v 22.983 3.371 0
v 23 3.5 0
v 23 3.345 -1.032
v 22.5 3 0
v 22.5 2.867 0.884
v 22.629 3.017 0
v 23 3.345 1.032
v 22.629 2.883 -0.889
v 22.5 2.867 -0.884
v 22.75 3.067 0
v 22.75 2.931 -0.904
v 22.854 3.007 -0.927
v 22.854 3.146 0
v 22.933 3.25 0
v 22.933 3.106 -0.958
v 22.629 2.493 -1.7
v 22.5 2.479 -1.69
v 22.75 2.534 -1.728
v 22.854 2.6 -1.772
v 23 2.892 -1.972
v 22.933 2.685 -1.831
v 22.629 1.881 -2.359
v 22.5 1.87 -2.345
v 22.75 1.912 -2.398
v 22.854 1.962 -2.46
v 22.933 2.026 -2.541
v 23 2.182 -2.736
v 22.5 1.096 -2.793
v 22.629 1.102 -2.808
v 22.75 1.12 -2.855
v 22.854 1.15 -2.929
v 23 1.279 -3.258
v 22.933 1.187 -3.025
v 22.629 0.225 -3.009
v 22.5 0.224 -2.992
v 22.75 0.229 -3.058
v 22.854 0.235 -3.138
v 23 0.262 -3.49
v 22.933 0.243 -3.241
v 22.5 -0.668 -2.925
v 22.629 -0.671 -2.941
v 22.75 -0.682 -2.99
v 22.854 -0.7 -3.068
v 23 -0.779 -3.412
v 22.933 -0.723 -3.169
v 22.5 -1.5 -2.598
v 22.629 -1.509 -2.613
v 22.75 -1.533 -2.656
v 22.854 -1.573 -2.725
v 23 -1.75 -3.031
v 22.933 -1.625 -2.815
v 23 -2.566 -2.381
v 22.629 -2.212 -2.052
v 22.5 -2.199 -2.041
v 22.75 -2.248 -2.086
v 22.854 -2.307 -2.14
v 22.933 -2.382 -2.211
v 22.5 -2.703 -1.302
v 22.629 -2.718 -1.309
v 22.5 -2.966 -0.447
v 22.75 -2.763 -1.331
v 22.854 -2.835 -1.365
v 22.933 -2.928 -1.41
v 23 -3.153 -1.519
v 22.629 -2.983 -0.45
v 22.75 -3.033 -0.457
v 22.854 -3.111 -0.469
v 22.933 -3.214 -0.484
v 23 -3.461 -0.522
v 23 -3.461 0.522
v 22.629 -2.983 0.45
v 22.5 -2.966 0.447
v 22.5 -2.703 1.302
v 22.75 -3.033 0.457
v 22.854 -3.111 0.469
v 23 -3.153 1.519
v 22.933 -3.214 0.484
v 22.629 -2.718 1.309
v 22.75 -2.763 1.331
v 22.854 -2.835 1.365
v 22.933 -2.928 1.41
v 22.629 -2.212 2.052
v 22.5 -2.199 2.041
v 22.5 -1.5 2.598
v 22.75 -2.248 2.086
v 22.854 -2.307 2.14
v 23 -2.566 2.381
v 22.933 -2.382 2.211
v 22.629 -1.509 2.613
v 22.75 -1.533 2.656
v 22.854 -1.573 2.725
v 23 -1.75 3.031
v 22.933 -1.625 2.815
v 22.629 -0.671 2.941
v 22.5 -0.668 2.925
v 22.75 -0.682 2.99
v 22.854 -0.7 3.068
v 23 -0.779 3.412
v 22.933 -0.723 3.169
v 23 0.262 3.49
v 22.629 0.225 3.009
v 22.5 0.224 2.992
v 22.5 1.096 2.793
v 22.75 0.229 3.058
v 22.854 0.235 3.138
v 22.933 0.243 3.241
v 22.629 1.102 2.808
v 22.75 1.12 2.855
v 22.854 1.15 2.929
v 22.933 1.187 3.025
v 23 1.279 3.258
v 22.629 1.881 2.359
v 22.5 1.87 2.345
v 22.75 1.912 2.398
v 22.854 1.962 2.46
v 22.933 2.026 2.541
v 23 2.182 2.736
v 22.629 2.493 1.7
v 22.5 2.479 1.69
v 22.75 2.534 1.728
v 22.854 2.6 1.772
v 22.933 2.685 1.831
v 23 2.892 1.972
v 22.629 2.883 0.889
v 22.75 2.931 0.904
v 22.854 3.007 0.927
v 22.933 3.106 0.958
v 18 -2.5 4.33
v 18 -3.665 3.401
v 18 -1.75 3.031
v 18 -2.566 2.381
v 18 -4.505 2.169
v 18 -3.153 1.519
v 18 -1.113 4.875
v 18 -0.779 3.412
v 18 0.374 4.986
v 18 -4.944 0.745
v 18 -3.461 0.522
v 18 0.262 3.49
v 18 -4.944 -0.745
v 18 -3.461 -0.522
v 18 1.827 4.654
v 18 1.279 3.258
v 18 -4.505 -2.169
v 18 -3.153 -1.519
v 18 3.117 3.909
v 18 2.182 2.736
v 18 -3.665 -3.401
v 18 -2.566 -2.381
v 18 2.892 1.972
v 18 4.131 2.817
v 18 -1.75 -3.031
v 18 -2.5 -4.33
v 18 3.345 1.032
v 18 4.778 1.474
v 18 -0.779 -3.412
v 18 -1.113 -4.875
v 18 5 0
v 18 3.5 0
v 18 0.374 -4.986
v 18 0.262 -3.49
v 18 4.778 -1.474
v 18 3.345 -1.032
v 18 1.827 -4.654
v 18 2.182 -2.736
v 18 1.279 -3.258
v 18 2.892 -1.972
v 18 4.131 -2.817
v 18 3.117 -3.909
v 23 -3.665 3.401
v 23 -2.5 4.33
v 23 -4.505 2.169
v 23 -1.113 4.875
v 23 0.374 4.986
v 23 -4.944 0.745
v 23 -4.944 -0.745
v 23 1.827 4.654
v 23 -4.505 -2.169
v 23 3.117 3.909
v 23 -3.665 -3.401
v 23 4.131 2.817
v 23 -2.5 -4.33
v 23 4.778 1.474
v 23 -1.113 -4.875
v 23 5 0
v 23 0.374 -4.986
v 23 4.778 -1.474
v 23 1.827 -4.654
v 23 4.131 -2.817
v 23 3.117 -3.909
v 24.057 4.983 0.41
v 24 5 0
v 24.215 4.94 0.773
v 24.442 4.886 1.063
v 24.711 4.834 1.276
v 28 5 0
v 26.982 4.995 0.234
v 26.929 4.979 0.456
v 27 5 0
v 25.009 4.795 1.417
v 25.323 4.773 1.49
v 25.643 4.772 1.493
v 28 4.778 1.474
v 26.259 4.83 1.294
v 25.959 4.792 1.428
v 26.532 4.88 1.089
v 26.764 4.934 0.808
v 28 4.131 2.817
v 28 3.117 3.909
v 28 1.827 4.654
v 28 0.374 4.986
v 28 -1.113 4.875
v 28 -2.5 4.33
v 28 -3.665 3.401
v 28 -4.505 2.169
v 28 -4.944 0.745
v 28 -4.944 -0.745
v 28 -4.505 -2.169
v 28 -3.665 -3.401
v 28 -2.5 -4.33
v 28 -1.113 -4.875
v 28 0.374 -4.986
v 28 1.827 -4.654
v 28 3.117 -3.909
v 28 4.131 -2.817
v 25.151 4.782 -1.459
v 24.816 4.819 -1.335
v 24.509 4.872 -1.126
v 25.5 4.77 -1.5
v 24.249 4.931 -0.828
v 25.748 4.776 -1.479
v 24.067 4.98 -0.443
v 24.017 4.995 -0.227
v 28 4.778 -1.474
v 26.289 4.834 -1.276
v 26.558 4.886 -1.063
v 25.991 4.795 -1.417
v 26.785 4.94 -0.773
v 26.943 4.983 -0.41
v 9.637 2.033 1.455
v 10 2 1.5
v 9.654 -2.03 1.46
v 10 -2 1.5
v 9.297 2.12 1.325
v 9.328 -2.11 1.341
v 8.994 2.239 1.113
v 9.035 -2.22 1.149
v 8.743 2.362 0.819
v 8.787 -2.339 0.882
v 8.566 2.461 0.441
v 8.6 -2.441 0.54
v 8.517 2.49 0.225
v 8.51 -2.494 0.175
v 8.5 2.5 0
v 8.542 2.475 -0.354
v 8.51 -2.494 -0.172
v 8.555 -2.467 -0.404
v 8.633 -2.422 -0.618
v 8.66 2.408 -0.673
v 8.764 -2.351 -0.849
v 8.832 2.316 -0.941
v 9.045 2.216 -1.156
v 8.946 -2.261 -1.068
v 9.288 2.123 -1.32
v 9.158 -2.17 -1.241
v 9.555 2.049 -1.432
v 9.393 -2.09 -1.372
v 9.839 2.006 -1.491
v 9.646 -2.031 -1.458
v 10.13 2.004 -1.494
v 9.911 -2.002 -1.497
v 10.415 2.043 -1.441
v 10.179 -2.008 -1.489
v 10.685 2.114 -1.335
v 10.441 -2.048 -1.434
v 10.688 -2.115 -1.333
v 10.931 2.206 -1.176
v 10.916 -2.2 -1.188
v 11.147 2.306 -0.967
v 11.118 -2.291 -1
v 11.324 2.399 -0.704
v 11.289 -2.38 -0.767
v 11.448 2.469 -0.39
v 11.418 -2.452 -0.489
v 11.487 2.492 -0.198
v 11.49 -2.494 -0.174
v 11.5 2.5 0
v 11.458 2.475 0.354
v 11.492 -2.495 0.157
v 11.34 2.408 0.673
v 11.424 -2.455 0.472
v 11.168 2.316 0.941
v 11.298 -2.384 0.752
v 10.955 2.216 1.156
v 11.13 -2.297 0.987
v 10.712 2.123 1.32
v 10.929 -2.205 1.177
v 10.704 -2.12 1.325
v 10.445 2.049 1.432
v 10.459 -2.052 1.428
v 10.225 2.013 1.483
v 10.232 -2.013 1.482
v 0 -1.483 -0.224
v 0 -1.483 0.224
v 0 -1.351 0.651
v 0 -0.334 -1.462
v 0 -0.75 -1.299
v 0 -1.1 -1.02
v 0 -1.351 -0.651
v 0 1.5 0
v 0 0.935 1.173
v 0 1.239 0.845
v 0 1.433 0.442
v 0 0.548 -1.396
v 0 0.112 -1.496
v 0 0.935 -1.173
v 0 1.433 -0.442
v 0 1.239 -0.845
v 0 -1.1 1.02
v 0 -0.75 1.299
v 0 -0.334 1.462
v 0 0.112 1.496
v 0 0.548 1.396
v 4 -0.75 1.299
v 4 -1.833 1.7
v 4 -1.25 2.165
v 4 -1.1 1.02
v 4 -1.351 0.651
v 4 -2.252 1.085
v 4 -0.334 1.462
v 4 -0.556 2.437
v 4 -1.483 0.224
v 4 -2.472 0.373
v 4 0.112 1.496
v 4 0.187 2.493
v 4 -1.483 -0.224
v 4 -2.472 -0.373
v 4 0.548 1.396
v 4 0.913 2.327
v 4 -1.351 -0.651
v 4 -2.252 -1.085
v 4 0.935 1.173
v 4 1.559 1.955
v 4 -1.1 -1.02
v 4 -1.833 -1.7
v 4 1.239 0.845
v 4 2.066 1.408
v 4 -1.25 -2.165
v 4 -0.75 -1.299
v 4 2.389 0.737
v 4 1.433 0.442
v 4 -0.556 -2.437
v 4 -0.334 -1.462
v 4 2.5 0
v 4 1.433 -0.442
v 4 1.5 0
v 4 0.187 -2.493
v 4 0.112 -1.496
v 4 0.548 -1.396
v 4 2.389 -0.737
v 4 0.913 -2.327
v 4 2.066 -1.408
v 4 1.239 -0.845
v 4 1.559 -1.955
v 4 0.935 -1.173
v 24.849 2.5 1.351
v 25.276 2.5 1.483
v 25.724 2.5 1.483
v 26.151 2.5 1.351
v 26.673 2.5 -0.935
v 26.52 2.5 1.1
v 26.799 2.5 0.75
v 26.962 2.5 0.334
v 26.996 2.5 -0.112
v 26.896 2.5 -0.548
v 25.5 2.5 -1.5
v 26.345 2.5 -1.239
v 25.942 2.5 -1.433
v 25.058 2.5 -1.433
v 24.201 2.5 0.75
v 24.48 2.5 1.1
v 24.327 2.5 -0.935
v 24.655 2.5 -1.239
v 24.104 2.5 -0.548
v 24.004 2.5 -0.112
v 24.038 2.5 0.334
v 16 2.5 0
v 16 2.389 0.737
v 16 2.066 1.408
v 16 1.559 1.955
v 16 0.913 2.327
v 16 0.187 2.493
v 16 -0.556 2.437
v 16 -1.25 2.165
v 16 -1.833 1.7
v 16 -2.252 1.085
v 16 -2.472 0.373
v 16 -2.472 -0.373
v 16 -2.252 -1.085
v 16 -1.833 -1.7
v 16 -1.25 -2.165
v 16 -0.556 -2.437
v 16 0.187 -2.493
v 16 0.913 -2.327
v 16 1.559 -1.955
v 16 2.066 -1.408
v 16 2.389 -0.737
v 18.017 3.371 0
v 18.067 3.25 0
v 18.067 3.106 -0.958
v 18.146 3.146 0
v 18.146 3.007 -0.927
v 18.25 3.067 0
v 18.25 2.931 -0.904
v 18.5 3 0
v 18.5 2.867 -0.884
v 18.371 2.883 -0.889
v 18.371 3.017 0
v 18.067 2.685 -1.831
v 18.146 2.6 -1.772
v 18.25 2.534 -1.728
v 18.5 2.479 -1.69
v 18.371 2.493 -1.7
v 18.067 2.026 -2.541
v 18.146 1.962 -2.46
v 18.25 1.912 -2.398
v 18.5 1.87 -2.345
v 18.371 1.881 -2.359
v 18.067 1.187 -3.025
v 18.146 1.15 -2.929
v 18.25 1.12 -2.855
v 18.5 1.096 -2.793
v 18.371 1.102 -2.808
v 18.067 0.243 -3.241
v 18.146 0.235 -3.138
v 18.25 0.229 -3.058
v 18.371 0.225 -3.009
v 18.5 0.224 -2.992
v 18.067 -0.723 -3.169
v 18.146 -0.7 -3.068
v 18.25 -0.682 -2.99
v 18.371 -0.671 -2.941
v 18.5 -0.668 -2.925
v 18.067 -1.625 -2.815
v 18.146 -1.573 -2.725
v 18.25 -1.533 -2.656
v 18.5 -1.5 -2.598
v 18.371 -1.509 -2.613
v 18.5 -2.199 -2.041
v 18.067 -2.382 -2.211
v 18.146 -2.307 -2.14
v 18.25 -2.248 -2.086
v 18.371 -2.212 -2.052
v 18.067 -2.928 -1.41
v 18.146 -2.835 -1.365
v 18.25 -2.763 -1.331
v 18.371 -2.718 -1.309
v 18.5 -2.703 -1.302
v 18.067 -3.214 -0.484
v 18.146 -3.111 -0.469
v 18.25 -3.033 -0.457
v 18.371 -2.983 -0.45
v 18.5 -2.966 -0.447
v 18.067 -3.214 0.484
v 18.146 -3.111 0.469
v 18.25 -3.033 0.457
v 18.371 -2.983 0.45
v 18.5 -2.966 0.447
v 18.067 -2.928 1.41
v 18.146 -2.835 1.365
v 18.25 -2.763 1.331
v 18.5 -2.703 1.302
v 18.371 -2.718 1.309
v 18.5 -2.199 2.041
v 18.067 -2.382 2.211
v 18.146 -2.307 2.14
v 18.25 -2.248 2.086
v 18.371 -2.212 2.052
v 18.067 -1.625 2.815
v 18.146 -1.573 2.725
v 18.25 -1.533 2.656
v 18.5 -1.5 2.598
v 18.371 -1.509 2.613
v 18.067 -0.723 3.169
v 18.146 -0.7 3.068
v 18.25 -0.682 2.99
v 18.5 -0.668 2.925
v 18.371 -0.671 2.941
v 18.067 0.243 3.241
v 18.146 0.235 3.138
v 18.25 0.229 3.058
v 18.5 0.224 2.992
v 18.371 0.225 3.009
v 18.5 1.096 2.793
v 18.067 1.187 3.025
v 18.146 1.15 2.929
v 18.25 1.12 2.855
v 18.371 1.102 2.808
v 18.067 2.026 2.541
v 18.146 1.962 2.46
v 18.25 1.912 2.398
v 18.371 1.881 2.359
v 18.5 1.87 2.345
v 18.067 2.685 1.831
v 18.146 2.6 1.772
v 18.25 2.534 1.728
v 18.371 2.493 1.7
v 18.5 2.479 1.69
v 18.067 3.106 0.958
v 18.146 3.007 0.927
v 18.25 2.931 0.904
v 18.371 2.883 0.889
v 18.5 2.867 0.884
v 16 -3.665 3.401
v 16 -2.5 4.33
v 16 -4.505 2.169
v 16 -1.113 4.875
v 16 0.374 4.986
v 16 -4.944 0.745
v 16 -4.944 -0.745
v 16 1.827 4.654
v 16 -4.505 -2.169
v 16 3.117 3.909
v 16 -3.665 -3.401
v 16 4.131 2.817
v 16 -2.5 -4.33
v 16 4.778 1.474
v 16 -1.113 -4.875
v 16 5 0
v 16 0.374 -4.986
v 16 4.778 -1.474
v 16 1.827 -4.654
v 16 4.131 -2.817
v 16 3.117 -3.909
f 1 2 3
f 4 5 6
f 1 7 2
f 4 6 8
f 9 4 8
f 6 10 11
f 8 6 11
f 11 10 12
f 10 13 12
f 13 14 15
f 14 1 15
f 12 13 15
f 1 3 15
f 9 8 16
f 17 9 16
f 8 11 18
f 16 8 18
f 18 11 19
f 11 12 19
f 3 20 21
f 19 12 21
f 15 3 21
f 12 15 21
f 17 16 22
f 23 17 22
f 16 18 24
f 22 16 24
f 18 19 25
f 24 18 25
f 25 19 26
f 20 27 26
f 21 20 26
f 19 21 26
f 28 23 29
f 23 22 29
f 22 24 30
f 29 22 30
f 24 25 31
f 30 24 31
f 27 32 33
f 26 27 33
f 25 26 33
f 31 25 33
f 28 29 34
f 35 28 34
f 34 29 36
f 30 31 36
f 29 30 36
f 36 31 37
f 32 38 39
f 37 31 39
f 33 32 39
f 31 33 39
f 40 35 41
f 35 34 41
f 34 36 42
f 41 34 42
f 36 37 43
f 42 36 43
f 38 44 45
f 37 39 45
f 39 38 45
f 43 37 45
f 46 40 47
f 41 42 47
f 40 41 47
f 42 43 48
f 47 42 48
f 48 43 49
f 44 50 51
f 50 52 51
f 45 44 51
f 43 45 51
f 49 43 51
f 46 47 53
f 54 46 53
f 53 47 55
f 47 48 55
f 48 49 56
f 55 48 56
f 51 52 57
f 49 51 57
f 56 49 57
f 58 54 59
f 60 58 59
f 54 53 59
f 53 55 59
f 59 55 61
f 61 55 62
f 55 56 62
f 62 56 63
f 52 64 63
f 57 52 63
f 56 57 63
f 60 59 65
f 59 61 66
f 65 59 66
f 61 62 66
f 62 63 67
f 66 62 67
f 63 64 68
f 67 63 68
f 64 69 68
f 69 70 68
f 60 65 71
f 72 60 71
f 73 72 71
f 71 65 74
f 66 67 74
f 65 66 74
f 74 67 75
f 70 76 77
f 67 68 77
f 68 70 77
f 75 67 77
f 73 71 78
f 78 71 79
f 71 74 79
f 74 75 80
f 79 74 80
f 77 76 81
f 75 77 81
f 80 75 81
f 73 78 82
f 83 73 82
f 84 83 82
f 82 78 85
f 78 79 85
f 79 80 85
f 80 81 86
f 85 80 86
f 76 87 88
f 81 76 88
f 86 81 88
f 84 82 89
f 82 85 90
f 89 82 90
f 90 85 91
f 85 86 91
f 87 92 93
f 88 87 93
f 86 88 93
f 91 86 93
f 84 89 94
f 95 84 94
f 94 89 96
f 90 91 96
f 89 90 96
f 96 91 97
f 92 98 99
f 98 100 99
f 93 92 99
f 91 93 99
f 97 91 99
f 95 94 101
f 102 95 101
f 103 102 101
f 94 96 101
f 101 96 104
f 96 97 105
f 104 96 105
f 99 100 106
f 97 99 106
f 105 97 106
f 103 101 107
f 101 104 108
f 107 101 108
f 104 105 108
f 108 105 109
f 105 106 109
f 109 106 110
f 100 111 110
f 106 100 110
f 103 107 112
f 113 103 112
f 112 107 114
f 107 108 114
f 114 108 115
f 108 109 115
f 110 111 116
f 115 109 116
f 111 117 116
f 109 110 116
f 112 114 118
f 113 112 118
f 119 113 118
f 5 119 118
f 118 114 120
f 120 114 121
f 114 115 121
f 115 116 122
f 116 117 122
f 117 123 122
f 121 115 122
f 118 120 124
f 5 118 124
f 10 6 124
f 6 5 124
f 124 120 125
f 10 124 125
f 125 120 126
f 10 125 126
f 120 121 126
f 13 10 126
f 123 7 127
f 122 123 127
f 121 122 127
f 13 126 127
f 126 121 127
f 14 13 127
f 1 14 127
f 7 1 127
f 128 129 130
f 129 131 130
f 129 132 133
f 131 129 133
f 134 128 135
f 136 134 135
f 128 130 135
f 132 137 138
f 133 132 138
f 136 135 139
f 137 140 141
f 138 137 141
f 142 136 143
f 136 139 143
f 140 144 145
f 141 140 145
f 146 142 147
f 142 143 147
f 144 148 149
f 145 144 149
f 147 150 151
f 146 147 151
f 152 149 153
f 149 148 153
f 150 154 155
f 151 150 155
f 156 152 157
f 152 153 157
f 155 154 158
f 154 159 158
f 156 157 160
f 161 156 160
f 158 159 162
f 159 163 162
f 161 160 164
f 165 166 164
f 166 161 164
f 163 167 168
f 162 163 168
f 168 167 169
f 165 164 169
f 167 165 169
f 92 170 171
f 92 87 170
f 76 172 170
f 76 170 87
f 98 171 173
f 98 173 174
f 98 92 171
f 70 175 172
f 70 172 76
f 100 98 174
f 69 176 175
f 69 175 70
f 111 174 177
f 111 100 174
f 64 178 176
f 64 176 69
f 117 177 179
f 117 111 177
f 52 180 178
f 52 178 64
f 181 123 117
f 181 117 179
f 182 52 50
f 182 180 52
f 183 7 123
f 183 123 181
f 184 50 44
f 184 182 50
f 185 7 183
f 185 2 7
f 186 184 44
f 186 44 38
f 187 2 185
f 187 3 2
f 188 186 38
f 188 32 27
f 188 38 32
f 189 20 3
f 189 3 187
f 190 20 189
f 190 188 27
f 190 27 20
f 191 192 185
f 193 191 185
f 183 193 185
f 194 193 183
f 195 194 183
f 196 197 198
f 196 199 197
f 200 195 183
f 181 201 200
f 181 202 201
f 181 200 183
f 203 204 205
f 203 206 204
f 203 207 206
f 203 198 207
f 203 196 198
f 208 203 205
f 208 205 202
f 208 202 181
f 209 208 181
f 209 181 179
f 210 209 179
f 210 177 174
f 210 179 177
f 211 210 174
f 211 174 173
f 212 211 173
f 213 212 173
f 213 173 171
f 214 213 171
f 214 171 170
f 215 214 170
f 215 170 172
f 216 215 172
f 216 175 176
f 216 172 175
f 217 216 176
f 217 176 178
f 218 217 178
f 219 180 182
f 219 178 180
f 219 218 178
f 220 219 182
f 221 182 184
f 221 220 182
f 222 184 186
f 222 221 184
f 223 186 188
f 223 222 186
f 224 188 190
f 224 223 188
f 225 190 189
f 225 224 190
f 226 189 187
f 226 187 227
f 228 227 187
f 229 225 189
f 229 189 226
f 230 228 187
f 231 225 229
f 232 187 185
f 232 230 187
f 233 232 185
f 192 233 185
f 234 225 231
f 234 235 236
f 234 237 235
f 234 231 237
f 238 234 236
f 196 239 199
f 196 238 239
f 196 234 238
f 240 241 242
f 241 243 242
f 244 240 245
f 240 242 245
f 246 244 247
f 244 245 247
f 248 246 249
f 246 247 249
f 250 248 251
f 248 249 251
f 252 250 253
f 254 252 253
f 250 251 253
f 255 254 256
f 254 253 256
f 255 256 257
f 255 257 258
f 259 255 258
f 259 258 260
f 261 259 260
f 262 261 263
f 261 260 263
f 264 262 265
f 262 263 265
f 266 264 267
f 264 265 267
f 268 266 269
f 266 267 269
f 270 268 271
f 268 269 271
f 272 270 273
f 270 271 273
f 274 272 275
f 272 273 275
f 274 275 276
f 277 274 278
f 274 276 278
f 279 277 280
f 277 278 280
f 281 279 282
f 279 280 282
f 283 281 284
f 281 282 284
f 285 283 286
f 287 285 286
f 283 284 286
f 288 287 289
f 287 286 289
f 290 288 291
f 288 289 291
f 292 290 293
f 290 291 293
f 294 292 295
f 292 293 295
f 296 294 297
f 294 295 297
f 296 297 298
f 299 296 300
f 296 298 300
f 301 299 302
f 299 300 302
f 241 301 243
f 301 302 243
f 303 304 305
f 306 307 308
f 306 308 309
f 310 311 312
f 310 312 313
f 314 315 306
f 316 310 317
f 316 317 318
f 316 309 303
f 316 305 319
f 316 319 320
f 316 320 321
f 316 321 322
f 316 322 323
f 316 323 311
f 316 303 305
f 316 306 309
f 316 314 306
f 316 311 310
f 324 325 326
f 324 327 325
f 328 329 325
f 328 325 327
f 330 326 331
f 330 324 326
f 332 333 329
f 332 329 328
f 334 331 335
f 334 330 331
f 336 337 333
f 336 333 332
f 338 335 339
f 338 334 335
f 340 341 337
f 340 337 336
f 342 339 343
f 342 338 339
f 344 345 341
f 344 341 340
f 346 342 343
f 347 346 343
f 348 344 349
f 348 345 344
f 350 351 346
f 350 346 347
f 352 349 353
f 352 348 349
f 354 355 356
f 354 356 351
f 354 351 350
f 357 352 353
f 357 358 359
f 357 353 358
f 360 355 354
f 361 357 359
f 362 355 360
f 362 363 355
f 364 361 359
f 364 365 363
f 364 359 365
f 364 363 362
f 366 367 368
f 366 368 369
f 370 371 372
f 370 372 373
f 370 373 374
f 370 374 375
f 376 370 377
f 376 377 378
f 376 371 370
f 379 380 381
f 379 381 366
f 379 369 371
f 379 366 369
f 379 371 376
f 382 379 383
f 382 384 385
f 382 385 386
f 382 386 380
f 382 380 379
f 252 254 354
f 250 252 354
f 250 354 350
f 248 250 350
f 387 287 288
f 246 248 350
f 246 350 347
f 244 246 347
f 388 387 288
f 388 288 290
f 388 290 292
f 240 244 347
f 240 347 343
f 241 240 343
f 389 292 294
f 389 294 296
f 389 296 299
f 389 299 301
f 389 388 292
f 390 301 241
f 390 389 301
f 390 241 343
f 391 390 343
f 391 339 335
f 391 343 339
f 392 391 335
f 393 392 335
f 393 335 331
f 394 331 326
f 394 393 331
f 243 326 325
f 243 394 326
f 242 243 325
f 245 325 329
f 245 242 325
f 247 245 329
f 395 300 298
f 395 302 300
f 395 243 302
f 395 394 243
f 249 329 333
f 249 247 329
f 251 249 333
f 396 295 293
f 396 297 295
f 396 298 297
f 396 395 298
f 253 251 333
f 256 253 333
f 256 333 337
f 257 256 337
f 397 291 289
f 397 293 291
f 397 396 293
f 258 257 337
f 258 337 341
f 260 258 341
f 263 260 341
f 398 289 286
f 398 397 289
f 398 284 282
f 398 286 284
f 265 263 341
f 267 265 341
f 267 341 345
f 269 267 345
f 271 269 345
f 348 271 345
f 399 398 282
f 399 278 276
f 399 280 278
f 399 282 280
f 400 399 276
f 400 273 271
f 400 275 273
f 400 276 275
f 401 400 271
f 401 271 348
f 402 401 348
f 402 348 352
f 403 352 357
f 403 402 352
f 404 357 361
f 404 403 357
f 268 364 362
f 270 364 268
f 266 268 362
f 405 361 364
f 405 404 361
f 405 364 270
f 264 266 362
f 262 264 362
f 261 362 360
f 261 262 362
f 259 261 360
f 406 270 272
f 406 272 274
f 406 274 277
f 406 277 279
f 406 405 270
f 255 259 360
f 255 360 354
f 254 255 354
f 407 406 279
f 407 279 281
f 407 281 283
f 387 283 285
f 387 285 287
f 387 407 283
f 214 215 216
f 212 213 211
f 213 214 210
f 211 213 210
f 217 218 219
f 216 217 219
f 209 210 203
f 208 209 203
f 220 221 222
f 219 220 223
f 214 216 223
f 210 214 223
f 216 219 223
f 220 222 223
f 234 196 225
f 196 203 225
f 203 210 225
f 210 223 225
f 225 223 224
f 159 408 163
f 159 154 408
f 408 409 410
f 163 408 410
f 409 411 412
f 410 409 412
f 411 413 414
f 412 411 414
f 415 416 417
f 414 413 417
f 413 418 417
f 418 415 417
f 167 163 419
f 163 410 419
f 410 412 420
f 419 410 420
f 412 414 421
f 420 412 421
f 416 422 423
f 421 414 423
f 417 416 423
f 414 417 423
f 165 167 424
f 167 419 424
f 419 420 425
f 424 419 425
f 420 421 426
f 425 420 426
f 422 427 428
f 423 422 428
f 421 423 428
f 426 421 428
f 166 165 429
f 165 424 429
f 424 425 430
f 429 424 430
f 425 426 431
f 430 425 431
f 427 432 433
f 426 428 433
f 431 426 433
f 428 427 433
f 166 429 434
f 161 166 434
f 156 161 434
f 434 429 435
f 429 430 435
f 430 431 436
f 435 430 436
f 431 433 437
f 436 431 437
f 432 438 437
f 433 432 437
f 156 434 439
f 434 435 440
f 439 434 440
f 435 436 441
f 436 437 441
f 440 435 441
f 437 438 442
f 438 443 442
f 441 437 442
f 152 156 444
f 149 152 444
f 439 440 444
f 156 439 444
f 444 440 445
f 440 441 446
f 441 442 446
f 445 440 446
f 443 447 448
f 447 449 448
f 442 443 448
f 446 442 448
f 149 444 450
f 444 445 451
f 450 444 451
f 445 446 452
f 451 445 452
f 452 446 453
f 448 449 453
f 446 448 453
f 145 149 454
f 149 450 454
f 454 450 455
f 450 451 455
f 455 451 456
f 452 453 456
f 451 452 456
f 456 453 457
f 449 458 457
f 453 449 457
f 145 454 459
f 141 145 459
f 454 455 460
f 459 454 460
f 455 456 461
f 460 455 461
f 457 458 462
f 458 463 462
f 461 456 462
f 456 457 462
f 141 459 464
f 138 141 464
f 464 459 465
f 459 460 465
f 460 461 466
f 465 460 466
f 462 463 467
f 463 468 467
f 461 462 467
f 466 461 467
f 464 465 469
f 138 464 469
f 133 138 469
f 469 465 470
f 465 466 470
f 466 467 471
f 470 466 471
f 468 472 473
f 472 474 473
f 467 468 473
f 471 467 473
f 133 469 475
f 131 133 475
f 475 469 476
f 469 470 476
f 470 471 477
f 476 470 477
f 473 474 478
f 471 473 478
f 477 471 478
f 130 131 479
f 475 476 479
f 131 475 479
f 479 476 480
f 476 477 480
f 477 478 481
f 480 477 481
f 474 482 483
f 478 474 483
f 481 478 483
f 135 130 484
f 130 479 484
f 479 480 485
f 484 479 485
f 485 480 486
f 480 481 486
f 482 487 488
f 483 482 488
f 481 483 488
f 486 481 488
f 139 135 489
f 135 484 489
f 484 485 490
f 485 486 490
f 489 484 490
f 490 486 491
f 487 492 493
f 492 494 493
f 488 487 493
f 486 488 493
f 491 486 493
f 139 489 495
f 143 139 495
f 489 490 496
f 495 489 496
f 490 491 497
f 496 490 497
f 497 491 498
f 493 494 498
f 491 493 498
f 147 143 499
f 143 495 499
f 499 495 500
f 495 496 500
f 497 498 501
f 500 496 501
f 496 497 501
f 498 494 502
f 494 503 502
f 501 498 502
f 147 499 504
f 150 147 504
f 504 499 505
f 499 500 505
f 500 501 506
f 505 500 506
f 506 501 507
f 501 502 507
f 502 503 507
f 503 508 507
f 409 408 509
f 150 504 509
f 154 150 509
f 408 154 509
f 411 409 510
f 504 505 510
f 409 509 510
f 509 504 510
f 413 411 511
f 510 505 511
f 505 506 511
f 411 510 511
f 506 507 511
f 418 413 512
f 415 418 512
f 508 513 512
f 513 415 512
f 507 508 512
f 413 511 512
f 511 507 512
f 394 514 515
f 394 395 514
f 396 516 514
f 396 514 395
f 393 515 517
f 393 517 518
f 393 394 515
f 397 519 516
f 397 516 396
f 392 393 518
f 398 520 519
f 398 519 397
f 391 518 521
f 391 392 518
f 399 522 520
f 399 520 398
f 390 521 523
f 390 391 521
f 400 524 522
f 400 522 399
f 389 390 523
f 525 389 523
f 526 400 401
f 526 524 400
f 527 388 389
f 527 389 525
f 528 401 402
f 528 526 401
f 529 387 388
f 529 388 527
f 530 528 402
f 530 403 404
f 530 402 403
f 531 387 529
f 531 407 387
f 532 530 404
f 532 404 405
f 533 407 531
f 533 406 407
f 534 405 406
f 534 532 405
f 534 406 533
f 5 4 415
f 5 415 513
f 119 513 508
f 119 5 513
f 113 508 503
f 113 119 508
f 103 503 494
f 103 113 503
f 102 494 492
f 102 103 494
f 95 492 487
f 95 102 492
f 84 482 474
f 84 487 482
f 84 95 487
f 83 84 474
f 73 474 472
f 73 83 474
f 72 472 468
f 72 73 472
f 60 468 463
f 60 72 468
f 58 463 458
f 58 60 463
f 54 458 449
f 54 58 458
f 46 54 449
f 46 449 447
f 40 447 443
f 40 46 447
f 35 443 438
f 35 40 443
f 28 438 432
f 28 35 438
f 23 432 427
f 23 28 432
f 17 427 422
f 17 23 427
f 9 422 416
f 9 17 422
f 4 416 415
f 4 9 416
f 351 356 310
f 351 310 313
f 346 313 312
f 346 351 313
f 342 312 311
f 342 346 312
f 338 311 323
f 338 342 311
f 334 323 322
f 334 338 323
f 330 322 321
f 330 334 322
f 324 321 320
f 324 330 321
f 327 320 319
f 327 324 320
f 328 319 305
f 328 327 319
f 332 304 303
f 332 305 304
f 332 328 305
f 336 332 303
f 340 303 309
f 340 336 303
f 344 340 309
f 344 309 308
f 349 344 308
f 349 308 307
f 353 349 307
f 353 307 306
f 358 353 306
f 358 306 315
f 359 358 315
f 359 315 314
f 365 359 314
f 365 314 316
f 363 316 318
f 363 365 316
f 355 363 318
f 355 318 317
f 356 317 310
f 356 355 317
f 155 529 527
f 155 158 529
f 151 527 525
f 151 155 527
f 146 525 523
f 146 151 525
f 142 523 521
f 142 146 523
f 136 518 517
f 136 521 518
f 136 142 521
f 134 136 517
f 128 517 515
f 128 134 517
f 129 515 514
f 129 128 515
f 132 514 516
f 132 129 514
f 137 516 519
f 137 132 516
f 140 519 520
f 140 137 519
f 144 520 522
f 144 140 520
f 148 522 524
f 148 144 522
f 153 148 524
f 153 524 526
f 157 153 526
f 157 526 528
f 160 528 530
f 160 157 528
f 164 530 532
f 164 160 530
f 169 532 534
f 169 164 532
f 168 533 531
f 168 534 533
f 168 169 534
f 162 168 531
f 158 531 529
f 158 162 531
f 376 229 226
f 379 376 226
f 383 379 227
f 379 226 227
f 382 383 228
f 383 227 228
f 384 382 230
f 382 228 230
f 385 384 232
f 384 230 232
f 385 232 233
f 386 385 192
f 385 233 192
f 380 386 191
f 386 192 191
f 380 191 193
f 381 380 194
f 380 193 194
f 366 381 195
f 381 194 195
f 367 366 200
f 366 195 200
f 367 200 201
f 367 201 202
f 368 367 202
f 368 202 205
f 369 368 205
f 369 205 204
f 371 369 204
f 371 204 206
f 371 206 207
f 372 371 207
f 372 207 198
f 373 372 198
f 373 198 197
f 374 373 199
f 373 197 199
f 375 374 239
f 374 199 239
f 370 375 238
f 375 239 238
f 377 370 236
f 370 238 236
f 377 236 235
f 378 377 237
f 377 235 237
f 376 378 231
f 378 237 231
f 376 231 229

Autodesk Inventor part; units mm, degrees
ref_plane "YZ Plane" through (0, 0, 0) normal (1, 0, 0) x (0, 1, 0)
ref_plane "XY Plane" through (0, 0, 0) normal (0, 0, 1) x (1, 0, 0)
sketch "Sketch1" plane through (0, 0, 0) normal (0, 0, 1) x (1, 0, 0)
  line L0 (0, 0) -> (0, 1.5)
  line L1 (0, 1.5) -> (4, 1.5)
  line L2 (4, 1.5) -> (4, 2.5)
  line L3 (4, 2.5) -> (16, 2.5)
  line L4 (16, 2.5) -> (16, 5)
  line L5 (16, 5) -> (18, 5)
  line L6 (18, 5) -> (18, 3)
  line L7 (18, 3) -> (23, 3)
  line L8 (23, 3) -> (23, 5)
  line L9 (23, 5) -> (28, 5)
  line L10 (28, 5) -> (28, 0)
  line L11 (28, 0) -> (0, 0)
  dimension "d0" = 28
  dimension "d1" = 5
  dimension "d2" = 5
  dimension "d3" = 2
  dimension "d4" = 12
  dimension "d5" = 3
  dimension "d6" = 5
  dimension "d7" = 10
  dimension "d8" = 6
revolve "Revolution1" add sketch "Sketch1" angle 360 about axis through (28, 0, 0) along (-1, 0, 0)
ref_plane "Work Plane1" through (0, 2.5, 0) normal (0, 1, 0) x (-1, 0, 0)
sketch "Sketch2" plane through (0, 2.5, 0) normal (0, 1, 0) x (-1, 0, 0)
  line L0 (-4, -2.5) -> (-4, 2.5) projected
  point P0 (0, 0)
  point P1 (-10, 0)
  dimension "d11" = 6
hole "Hole1" at (10, 2.5, 0) direction (0, -1, 0) diameter 3 end through all
thread "Thread1" size "M3x0.5" class "6g" standard "ISO Metric profile" length 10
fillet "Fillet1" radius 0.5 2 edges at (18, -3, 0) (23, -3, 0)
sketch "Sketch4" plane through (0, 2.5, 0) normal (0, 1, 0) x (-1, 0, 0)
  line L0 (-28, -5) -> (-28, 5) projected
  point P0 (0, 0)
  point P1 (-25.5, 0)
  point P2 (-28, 0)
  dimension "d22" = 2.5
hole "Hole2" at (25.5, 2.5, 0) direction (0, 1, 0) diameter 3 end through all
thread "Thread2" size "M3x0.5" class "6H" standard "ISO Metric profile" length 10
properties part number "141"
